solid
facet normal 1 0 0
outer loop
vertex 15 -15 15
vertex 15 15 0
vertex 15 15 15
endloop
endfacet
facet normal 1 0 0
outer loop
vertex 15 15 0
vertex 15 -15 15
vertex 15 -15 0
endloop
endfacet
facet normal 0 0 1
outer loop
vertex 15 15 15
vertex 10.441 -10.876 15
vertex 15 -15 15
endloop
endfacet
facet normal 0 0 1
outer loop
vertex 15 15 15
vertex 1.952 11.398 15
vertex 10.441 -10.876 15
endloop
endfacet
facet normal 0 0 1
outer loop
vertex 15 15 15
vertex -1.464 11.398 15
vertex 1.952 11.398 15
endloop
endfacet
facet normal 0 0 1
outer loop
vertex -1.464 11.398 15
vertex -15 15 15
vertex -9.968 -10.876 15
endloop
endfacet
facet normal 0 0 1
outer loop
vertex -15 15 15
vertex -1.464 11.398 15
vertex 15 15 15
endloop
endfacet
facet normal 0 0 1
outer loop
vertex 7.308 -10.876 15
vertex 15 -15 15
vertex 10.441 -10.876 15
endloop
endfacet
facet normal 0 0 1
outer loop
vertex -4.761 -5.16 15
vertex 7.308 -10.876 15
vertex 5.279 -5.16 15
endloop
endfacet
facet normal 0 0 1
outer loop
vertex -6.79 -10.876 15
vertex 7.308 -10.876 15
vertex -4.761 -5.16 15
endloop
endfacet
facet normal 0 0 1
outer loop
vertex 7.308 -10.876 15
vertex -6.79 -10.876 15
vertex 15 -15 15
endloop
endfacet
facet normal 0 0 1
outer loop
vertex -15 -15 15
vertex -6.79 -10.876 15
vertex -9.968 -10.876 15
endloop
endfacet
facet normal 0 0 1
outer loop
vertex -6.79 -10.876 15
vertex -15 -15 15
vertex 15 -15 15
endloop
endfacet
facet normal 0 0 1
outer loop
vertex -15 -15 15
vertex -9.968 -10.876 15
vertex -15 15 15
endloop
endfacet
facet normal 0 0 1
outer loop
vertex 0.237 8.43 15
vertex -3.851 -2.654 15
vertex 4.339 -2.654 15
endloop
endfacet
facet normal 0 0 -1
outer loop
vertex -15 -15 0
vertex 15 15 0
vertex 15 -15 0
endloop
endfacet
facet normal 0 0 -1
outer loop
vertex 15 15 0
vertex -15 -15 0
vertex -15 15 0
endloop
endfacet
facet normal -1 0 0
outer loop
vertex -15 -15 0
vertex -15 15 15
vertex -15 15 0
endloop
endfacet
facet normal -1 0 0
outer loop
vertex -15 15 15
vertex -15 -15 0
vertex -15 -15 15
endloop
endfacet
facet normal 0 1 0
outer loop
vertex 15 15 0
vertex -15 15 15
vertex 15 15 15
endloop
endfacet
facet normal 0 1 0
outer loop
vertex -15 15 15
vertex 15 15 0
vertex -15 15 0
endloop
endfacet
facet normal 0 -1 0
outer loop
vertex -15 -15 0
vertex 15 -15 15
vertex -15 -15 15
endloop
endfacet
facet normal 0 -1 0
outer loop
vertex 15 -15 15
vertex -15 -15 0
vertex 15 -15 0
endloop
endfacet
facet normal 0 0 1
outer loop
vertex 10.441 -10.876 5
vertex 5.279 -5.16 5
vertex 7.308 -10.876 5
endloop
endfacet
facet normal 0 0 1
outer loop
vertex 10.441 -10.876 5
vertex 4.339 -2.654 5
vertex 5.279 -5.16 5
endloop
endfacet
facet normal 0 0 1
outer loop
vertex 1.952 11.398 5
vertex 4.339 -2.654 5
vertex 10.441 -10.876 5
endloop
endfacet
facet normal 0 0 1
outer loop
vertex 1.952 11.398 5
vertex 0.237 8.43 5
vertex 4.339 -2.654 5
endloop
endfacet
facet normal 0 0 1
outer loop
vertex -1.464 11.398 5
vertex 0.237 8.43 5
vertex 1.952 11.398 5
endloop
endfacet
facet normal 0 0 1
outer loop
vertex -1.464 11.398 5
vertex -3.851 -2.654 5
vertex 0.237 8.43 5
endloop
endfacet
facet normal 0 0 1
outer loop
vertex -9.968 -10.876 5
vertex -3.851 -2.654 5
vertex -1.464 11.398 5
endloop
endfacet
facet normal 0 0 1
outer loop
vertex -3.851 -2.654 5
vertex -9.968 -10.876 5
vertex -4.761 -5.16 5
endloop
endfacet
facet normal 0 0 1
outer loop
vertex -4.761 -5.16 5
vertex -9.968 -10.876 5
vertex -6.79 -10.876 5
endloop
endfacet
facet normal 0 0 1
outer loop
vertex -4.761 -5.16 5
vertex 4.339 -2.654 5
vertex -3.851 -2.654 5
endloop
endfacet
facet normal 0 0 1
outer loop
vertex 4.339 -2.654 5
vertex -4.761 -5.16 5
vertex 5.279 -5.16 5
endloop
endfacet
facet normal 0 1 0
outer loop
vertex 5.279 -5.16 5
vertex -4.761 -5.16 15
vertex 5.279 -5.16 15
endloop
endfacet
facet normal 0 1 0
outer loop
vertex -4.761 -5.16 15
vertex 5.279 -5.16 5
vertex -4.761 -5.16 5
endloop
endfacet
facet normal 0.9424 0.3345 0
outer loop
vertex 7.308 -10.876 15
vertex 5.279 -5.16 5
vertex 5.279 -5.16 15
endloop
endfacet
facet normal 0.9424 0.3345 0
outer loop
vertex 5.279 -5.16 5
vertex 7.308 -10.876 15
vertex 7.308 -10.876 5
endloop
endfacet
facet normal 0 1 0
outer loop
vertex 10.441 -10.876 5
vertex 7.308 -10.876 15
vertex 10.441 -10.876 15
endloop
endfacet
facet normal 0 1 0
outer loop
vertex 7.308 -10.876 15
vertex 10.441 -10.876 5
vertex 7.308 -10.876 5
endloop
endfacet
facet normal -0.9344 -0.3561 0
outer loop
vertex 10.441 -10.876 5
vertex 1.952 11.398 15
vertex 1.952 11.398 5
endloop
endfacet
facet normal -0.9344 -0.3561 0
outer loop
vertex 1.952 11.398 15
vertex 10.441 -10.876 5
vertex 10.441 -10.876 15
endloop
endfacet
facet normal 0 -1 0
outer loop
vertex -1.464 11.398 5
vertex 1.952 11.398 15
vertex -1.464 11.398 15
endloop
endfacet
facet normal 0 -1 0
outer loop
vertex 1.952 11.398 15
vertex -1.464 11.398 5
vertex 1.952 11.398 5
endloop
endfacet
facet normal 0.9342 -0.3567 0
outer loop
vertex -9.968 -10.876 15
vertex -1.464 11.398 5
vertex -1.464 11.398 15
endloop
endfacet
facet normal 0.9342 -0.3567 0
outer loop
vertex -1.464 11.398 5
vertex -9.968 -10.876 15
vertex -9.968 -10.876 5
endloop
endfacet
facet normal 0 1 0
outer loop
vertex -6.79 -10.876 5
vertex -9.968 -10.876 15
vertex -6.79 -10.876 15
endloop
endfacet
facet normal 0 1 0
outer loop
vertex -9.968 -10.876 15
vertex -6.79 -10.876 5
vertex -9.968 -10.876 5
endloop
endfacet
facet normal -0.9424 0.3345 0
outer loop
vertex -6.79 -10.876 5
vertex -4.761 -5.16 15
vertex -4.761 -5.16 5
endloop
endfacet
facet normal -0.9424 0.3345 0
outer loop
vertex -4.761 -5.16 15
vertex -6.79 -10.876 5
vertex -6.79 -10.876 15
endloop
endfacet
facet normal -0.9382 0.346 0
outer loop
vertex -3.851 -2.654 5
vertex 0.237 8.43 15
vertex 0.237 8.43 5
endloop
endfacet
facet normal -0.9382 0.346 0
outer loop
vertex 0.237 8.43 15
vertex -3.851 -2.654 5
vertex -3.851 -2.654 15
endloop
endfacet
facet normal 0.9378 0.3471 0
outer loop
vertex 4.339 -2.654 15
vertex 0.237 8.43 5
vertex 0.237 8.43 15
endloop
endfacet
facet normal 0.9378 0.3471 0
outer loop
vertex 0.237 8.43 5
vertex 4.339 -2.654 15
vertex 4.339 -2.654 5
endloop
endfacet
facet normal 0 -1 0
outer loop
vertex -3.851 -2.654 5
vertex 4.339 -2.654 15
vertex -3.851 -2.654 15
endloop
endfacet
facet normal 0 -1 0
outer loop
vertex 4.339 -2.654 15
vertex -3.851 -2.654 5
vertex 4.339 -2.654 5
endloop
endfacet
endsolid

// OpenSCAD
// LetterBlock.scad - Basic usage of text() and linear_extrude()

//vartest
vartest = "A";
LetterBlock(vartest);
vartest2 = 30;
vartest3=30;

// Module definition.
// size=30 defines an optional parameter with a default value.
module LetterBlock(letter, size=30) {
    difference() {
        translate([0,0,size/4]) cube([vartest3,vartest2,size/2], center=true);
        translate([0,0,size/6]) {
            // convexity is needed for correct preview
            // since characters can be highly concave
            linear_extrude(height=size, convexity=4)
                text(letter, 
                     size=size*22/30,
                     font="Bitstream Vera Sans",
                     halign="center",
                     valign="center");
        }
    }
}

echo(version=version());
// Written by Marius Kintel <marius@kintel.net>
//
// To the extent possible under law, the author(s) have dedicated all
// copyright and related and neighboring rights to this software to the
// public domain worldwide. This software is distributed without any
// warranty.
//
// You should have received a copy of the CC0 Public Domain
// Dedication along with this software.
// If not, see <http://creativecommons.org/publicdomain/zero/1.0/>.
